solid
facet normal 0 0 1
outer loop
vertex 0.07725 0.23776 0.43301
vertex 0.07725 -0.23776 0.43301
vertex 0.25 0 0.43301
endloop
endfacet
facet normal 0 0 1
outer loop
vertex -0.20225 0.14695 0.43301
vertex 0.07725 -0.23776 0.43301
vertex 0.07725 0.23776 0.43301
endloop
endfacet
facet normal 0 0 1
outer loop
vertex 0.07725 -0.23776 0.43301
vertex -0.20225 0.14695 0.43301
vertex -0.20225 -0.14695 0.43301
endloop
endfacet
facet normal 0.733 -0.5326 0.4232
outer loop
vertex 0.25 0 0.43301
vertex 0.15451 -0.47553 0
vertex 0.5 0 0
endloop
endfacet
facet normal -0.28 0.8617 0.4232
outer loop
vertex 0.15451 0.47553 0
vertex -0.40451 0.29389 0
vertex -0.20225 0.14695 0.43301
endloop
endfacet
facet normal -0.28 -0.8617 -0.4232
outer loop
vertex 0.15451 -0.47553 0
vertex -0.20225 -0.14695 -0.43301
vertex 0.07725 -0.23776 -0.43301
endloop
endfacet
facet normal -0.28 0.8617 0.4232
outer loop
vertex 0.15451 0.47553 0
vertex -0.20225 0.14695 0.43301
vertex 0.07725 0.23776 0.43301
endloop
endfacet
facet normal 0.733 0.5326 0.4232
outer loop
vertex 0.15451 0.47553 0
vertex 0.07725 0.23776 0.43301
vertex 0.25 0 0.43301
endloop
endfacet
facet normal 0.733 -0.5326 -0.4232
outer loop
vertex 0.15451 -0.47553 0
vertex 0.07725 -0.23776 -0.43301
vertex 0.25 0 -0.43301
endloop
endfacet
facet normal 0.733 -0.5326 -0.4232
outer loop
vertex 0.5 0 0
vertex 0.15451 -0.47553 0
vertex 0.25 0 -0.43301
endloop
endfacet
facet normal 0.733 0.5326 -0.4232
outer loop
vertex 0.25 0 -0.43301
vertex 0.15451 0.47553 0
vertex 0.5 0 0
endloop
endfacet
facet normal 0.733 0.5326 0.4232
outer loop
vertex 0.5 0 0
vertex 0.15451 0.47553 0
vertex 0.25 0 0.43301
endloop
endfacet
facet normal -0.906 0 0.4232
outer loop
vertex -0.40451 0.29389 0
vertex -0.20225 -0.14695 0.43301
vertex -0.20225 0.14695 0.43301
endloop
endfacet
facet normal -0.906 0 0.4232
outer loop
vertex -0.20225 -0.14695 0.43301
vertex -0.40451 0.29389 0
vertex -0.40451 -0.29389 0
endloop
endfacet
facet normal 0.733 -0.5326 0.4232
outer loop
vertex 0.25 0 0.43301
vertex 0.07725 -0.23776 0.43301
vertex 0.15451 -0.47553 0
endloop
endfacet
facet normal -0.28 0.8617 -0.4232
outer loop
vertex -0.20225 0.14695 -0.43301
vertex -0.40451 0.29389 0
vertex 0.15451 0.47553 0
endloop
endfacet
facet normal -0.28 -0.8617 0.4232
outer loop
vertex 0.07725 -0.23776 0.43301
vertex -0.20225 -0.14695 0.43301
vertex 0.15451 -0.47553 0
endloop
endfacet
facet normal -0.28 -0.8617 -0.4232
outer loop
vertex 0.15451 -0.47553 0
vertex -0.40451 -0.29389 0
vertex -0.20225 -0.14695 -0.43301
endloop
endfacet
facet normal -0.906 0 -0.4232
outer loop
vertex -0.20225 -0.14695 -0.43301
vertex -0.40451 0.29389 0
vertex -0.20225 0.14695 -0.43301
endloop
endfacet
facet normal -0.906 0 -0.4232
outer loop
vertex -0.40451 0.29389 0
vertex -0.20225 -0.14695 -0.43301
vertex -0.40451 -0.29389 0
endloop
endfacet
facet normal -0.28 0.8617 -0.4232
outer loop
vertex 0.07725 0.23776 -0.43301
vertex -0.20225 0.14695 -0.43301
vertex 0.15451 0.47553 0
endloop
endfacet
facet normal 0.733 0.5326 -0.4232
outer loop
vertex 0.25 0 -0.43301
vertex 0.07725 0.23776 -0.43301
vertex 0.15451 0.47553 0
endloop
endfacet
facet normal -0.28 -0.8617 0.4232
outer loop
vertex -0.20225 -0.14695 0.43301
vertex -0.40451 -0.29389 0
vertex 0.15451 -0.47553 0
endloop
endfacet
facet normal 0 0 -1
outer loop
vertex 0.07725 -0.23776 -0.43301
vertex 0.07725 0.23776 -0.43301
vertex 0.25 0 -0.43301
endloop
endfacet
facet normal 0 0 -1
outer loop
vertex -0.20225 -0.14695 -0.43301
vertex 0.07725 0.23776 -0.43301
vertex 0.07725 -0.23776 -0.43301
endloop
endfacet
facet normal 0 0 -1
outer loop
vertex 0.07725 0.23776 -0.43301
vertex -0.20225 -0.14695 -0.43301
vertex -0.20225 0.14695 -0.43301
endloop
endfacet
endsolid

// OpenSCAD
use <eval.scad>;

f = ["pow", "x", 2];

plot(f, 0, 1, 0.1);

module plot(f, _min, _max, _res){
for(i = [_min : _res : _max])
translate([i, eval(f,[i]), 0])
sphere(d = 1);
}
